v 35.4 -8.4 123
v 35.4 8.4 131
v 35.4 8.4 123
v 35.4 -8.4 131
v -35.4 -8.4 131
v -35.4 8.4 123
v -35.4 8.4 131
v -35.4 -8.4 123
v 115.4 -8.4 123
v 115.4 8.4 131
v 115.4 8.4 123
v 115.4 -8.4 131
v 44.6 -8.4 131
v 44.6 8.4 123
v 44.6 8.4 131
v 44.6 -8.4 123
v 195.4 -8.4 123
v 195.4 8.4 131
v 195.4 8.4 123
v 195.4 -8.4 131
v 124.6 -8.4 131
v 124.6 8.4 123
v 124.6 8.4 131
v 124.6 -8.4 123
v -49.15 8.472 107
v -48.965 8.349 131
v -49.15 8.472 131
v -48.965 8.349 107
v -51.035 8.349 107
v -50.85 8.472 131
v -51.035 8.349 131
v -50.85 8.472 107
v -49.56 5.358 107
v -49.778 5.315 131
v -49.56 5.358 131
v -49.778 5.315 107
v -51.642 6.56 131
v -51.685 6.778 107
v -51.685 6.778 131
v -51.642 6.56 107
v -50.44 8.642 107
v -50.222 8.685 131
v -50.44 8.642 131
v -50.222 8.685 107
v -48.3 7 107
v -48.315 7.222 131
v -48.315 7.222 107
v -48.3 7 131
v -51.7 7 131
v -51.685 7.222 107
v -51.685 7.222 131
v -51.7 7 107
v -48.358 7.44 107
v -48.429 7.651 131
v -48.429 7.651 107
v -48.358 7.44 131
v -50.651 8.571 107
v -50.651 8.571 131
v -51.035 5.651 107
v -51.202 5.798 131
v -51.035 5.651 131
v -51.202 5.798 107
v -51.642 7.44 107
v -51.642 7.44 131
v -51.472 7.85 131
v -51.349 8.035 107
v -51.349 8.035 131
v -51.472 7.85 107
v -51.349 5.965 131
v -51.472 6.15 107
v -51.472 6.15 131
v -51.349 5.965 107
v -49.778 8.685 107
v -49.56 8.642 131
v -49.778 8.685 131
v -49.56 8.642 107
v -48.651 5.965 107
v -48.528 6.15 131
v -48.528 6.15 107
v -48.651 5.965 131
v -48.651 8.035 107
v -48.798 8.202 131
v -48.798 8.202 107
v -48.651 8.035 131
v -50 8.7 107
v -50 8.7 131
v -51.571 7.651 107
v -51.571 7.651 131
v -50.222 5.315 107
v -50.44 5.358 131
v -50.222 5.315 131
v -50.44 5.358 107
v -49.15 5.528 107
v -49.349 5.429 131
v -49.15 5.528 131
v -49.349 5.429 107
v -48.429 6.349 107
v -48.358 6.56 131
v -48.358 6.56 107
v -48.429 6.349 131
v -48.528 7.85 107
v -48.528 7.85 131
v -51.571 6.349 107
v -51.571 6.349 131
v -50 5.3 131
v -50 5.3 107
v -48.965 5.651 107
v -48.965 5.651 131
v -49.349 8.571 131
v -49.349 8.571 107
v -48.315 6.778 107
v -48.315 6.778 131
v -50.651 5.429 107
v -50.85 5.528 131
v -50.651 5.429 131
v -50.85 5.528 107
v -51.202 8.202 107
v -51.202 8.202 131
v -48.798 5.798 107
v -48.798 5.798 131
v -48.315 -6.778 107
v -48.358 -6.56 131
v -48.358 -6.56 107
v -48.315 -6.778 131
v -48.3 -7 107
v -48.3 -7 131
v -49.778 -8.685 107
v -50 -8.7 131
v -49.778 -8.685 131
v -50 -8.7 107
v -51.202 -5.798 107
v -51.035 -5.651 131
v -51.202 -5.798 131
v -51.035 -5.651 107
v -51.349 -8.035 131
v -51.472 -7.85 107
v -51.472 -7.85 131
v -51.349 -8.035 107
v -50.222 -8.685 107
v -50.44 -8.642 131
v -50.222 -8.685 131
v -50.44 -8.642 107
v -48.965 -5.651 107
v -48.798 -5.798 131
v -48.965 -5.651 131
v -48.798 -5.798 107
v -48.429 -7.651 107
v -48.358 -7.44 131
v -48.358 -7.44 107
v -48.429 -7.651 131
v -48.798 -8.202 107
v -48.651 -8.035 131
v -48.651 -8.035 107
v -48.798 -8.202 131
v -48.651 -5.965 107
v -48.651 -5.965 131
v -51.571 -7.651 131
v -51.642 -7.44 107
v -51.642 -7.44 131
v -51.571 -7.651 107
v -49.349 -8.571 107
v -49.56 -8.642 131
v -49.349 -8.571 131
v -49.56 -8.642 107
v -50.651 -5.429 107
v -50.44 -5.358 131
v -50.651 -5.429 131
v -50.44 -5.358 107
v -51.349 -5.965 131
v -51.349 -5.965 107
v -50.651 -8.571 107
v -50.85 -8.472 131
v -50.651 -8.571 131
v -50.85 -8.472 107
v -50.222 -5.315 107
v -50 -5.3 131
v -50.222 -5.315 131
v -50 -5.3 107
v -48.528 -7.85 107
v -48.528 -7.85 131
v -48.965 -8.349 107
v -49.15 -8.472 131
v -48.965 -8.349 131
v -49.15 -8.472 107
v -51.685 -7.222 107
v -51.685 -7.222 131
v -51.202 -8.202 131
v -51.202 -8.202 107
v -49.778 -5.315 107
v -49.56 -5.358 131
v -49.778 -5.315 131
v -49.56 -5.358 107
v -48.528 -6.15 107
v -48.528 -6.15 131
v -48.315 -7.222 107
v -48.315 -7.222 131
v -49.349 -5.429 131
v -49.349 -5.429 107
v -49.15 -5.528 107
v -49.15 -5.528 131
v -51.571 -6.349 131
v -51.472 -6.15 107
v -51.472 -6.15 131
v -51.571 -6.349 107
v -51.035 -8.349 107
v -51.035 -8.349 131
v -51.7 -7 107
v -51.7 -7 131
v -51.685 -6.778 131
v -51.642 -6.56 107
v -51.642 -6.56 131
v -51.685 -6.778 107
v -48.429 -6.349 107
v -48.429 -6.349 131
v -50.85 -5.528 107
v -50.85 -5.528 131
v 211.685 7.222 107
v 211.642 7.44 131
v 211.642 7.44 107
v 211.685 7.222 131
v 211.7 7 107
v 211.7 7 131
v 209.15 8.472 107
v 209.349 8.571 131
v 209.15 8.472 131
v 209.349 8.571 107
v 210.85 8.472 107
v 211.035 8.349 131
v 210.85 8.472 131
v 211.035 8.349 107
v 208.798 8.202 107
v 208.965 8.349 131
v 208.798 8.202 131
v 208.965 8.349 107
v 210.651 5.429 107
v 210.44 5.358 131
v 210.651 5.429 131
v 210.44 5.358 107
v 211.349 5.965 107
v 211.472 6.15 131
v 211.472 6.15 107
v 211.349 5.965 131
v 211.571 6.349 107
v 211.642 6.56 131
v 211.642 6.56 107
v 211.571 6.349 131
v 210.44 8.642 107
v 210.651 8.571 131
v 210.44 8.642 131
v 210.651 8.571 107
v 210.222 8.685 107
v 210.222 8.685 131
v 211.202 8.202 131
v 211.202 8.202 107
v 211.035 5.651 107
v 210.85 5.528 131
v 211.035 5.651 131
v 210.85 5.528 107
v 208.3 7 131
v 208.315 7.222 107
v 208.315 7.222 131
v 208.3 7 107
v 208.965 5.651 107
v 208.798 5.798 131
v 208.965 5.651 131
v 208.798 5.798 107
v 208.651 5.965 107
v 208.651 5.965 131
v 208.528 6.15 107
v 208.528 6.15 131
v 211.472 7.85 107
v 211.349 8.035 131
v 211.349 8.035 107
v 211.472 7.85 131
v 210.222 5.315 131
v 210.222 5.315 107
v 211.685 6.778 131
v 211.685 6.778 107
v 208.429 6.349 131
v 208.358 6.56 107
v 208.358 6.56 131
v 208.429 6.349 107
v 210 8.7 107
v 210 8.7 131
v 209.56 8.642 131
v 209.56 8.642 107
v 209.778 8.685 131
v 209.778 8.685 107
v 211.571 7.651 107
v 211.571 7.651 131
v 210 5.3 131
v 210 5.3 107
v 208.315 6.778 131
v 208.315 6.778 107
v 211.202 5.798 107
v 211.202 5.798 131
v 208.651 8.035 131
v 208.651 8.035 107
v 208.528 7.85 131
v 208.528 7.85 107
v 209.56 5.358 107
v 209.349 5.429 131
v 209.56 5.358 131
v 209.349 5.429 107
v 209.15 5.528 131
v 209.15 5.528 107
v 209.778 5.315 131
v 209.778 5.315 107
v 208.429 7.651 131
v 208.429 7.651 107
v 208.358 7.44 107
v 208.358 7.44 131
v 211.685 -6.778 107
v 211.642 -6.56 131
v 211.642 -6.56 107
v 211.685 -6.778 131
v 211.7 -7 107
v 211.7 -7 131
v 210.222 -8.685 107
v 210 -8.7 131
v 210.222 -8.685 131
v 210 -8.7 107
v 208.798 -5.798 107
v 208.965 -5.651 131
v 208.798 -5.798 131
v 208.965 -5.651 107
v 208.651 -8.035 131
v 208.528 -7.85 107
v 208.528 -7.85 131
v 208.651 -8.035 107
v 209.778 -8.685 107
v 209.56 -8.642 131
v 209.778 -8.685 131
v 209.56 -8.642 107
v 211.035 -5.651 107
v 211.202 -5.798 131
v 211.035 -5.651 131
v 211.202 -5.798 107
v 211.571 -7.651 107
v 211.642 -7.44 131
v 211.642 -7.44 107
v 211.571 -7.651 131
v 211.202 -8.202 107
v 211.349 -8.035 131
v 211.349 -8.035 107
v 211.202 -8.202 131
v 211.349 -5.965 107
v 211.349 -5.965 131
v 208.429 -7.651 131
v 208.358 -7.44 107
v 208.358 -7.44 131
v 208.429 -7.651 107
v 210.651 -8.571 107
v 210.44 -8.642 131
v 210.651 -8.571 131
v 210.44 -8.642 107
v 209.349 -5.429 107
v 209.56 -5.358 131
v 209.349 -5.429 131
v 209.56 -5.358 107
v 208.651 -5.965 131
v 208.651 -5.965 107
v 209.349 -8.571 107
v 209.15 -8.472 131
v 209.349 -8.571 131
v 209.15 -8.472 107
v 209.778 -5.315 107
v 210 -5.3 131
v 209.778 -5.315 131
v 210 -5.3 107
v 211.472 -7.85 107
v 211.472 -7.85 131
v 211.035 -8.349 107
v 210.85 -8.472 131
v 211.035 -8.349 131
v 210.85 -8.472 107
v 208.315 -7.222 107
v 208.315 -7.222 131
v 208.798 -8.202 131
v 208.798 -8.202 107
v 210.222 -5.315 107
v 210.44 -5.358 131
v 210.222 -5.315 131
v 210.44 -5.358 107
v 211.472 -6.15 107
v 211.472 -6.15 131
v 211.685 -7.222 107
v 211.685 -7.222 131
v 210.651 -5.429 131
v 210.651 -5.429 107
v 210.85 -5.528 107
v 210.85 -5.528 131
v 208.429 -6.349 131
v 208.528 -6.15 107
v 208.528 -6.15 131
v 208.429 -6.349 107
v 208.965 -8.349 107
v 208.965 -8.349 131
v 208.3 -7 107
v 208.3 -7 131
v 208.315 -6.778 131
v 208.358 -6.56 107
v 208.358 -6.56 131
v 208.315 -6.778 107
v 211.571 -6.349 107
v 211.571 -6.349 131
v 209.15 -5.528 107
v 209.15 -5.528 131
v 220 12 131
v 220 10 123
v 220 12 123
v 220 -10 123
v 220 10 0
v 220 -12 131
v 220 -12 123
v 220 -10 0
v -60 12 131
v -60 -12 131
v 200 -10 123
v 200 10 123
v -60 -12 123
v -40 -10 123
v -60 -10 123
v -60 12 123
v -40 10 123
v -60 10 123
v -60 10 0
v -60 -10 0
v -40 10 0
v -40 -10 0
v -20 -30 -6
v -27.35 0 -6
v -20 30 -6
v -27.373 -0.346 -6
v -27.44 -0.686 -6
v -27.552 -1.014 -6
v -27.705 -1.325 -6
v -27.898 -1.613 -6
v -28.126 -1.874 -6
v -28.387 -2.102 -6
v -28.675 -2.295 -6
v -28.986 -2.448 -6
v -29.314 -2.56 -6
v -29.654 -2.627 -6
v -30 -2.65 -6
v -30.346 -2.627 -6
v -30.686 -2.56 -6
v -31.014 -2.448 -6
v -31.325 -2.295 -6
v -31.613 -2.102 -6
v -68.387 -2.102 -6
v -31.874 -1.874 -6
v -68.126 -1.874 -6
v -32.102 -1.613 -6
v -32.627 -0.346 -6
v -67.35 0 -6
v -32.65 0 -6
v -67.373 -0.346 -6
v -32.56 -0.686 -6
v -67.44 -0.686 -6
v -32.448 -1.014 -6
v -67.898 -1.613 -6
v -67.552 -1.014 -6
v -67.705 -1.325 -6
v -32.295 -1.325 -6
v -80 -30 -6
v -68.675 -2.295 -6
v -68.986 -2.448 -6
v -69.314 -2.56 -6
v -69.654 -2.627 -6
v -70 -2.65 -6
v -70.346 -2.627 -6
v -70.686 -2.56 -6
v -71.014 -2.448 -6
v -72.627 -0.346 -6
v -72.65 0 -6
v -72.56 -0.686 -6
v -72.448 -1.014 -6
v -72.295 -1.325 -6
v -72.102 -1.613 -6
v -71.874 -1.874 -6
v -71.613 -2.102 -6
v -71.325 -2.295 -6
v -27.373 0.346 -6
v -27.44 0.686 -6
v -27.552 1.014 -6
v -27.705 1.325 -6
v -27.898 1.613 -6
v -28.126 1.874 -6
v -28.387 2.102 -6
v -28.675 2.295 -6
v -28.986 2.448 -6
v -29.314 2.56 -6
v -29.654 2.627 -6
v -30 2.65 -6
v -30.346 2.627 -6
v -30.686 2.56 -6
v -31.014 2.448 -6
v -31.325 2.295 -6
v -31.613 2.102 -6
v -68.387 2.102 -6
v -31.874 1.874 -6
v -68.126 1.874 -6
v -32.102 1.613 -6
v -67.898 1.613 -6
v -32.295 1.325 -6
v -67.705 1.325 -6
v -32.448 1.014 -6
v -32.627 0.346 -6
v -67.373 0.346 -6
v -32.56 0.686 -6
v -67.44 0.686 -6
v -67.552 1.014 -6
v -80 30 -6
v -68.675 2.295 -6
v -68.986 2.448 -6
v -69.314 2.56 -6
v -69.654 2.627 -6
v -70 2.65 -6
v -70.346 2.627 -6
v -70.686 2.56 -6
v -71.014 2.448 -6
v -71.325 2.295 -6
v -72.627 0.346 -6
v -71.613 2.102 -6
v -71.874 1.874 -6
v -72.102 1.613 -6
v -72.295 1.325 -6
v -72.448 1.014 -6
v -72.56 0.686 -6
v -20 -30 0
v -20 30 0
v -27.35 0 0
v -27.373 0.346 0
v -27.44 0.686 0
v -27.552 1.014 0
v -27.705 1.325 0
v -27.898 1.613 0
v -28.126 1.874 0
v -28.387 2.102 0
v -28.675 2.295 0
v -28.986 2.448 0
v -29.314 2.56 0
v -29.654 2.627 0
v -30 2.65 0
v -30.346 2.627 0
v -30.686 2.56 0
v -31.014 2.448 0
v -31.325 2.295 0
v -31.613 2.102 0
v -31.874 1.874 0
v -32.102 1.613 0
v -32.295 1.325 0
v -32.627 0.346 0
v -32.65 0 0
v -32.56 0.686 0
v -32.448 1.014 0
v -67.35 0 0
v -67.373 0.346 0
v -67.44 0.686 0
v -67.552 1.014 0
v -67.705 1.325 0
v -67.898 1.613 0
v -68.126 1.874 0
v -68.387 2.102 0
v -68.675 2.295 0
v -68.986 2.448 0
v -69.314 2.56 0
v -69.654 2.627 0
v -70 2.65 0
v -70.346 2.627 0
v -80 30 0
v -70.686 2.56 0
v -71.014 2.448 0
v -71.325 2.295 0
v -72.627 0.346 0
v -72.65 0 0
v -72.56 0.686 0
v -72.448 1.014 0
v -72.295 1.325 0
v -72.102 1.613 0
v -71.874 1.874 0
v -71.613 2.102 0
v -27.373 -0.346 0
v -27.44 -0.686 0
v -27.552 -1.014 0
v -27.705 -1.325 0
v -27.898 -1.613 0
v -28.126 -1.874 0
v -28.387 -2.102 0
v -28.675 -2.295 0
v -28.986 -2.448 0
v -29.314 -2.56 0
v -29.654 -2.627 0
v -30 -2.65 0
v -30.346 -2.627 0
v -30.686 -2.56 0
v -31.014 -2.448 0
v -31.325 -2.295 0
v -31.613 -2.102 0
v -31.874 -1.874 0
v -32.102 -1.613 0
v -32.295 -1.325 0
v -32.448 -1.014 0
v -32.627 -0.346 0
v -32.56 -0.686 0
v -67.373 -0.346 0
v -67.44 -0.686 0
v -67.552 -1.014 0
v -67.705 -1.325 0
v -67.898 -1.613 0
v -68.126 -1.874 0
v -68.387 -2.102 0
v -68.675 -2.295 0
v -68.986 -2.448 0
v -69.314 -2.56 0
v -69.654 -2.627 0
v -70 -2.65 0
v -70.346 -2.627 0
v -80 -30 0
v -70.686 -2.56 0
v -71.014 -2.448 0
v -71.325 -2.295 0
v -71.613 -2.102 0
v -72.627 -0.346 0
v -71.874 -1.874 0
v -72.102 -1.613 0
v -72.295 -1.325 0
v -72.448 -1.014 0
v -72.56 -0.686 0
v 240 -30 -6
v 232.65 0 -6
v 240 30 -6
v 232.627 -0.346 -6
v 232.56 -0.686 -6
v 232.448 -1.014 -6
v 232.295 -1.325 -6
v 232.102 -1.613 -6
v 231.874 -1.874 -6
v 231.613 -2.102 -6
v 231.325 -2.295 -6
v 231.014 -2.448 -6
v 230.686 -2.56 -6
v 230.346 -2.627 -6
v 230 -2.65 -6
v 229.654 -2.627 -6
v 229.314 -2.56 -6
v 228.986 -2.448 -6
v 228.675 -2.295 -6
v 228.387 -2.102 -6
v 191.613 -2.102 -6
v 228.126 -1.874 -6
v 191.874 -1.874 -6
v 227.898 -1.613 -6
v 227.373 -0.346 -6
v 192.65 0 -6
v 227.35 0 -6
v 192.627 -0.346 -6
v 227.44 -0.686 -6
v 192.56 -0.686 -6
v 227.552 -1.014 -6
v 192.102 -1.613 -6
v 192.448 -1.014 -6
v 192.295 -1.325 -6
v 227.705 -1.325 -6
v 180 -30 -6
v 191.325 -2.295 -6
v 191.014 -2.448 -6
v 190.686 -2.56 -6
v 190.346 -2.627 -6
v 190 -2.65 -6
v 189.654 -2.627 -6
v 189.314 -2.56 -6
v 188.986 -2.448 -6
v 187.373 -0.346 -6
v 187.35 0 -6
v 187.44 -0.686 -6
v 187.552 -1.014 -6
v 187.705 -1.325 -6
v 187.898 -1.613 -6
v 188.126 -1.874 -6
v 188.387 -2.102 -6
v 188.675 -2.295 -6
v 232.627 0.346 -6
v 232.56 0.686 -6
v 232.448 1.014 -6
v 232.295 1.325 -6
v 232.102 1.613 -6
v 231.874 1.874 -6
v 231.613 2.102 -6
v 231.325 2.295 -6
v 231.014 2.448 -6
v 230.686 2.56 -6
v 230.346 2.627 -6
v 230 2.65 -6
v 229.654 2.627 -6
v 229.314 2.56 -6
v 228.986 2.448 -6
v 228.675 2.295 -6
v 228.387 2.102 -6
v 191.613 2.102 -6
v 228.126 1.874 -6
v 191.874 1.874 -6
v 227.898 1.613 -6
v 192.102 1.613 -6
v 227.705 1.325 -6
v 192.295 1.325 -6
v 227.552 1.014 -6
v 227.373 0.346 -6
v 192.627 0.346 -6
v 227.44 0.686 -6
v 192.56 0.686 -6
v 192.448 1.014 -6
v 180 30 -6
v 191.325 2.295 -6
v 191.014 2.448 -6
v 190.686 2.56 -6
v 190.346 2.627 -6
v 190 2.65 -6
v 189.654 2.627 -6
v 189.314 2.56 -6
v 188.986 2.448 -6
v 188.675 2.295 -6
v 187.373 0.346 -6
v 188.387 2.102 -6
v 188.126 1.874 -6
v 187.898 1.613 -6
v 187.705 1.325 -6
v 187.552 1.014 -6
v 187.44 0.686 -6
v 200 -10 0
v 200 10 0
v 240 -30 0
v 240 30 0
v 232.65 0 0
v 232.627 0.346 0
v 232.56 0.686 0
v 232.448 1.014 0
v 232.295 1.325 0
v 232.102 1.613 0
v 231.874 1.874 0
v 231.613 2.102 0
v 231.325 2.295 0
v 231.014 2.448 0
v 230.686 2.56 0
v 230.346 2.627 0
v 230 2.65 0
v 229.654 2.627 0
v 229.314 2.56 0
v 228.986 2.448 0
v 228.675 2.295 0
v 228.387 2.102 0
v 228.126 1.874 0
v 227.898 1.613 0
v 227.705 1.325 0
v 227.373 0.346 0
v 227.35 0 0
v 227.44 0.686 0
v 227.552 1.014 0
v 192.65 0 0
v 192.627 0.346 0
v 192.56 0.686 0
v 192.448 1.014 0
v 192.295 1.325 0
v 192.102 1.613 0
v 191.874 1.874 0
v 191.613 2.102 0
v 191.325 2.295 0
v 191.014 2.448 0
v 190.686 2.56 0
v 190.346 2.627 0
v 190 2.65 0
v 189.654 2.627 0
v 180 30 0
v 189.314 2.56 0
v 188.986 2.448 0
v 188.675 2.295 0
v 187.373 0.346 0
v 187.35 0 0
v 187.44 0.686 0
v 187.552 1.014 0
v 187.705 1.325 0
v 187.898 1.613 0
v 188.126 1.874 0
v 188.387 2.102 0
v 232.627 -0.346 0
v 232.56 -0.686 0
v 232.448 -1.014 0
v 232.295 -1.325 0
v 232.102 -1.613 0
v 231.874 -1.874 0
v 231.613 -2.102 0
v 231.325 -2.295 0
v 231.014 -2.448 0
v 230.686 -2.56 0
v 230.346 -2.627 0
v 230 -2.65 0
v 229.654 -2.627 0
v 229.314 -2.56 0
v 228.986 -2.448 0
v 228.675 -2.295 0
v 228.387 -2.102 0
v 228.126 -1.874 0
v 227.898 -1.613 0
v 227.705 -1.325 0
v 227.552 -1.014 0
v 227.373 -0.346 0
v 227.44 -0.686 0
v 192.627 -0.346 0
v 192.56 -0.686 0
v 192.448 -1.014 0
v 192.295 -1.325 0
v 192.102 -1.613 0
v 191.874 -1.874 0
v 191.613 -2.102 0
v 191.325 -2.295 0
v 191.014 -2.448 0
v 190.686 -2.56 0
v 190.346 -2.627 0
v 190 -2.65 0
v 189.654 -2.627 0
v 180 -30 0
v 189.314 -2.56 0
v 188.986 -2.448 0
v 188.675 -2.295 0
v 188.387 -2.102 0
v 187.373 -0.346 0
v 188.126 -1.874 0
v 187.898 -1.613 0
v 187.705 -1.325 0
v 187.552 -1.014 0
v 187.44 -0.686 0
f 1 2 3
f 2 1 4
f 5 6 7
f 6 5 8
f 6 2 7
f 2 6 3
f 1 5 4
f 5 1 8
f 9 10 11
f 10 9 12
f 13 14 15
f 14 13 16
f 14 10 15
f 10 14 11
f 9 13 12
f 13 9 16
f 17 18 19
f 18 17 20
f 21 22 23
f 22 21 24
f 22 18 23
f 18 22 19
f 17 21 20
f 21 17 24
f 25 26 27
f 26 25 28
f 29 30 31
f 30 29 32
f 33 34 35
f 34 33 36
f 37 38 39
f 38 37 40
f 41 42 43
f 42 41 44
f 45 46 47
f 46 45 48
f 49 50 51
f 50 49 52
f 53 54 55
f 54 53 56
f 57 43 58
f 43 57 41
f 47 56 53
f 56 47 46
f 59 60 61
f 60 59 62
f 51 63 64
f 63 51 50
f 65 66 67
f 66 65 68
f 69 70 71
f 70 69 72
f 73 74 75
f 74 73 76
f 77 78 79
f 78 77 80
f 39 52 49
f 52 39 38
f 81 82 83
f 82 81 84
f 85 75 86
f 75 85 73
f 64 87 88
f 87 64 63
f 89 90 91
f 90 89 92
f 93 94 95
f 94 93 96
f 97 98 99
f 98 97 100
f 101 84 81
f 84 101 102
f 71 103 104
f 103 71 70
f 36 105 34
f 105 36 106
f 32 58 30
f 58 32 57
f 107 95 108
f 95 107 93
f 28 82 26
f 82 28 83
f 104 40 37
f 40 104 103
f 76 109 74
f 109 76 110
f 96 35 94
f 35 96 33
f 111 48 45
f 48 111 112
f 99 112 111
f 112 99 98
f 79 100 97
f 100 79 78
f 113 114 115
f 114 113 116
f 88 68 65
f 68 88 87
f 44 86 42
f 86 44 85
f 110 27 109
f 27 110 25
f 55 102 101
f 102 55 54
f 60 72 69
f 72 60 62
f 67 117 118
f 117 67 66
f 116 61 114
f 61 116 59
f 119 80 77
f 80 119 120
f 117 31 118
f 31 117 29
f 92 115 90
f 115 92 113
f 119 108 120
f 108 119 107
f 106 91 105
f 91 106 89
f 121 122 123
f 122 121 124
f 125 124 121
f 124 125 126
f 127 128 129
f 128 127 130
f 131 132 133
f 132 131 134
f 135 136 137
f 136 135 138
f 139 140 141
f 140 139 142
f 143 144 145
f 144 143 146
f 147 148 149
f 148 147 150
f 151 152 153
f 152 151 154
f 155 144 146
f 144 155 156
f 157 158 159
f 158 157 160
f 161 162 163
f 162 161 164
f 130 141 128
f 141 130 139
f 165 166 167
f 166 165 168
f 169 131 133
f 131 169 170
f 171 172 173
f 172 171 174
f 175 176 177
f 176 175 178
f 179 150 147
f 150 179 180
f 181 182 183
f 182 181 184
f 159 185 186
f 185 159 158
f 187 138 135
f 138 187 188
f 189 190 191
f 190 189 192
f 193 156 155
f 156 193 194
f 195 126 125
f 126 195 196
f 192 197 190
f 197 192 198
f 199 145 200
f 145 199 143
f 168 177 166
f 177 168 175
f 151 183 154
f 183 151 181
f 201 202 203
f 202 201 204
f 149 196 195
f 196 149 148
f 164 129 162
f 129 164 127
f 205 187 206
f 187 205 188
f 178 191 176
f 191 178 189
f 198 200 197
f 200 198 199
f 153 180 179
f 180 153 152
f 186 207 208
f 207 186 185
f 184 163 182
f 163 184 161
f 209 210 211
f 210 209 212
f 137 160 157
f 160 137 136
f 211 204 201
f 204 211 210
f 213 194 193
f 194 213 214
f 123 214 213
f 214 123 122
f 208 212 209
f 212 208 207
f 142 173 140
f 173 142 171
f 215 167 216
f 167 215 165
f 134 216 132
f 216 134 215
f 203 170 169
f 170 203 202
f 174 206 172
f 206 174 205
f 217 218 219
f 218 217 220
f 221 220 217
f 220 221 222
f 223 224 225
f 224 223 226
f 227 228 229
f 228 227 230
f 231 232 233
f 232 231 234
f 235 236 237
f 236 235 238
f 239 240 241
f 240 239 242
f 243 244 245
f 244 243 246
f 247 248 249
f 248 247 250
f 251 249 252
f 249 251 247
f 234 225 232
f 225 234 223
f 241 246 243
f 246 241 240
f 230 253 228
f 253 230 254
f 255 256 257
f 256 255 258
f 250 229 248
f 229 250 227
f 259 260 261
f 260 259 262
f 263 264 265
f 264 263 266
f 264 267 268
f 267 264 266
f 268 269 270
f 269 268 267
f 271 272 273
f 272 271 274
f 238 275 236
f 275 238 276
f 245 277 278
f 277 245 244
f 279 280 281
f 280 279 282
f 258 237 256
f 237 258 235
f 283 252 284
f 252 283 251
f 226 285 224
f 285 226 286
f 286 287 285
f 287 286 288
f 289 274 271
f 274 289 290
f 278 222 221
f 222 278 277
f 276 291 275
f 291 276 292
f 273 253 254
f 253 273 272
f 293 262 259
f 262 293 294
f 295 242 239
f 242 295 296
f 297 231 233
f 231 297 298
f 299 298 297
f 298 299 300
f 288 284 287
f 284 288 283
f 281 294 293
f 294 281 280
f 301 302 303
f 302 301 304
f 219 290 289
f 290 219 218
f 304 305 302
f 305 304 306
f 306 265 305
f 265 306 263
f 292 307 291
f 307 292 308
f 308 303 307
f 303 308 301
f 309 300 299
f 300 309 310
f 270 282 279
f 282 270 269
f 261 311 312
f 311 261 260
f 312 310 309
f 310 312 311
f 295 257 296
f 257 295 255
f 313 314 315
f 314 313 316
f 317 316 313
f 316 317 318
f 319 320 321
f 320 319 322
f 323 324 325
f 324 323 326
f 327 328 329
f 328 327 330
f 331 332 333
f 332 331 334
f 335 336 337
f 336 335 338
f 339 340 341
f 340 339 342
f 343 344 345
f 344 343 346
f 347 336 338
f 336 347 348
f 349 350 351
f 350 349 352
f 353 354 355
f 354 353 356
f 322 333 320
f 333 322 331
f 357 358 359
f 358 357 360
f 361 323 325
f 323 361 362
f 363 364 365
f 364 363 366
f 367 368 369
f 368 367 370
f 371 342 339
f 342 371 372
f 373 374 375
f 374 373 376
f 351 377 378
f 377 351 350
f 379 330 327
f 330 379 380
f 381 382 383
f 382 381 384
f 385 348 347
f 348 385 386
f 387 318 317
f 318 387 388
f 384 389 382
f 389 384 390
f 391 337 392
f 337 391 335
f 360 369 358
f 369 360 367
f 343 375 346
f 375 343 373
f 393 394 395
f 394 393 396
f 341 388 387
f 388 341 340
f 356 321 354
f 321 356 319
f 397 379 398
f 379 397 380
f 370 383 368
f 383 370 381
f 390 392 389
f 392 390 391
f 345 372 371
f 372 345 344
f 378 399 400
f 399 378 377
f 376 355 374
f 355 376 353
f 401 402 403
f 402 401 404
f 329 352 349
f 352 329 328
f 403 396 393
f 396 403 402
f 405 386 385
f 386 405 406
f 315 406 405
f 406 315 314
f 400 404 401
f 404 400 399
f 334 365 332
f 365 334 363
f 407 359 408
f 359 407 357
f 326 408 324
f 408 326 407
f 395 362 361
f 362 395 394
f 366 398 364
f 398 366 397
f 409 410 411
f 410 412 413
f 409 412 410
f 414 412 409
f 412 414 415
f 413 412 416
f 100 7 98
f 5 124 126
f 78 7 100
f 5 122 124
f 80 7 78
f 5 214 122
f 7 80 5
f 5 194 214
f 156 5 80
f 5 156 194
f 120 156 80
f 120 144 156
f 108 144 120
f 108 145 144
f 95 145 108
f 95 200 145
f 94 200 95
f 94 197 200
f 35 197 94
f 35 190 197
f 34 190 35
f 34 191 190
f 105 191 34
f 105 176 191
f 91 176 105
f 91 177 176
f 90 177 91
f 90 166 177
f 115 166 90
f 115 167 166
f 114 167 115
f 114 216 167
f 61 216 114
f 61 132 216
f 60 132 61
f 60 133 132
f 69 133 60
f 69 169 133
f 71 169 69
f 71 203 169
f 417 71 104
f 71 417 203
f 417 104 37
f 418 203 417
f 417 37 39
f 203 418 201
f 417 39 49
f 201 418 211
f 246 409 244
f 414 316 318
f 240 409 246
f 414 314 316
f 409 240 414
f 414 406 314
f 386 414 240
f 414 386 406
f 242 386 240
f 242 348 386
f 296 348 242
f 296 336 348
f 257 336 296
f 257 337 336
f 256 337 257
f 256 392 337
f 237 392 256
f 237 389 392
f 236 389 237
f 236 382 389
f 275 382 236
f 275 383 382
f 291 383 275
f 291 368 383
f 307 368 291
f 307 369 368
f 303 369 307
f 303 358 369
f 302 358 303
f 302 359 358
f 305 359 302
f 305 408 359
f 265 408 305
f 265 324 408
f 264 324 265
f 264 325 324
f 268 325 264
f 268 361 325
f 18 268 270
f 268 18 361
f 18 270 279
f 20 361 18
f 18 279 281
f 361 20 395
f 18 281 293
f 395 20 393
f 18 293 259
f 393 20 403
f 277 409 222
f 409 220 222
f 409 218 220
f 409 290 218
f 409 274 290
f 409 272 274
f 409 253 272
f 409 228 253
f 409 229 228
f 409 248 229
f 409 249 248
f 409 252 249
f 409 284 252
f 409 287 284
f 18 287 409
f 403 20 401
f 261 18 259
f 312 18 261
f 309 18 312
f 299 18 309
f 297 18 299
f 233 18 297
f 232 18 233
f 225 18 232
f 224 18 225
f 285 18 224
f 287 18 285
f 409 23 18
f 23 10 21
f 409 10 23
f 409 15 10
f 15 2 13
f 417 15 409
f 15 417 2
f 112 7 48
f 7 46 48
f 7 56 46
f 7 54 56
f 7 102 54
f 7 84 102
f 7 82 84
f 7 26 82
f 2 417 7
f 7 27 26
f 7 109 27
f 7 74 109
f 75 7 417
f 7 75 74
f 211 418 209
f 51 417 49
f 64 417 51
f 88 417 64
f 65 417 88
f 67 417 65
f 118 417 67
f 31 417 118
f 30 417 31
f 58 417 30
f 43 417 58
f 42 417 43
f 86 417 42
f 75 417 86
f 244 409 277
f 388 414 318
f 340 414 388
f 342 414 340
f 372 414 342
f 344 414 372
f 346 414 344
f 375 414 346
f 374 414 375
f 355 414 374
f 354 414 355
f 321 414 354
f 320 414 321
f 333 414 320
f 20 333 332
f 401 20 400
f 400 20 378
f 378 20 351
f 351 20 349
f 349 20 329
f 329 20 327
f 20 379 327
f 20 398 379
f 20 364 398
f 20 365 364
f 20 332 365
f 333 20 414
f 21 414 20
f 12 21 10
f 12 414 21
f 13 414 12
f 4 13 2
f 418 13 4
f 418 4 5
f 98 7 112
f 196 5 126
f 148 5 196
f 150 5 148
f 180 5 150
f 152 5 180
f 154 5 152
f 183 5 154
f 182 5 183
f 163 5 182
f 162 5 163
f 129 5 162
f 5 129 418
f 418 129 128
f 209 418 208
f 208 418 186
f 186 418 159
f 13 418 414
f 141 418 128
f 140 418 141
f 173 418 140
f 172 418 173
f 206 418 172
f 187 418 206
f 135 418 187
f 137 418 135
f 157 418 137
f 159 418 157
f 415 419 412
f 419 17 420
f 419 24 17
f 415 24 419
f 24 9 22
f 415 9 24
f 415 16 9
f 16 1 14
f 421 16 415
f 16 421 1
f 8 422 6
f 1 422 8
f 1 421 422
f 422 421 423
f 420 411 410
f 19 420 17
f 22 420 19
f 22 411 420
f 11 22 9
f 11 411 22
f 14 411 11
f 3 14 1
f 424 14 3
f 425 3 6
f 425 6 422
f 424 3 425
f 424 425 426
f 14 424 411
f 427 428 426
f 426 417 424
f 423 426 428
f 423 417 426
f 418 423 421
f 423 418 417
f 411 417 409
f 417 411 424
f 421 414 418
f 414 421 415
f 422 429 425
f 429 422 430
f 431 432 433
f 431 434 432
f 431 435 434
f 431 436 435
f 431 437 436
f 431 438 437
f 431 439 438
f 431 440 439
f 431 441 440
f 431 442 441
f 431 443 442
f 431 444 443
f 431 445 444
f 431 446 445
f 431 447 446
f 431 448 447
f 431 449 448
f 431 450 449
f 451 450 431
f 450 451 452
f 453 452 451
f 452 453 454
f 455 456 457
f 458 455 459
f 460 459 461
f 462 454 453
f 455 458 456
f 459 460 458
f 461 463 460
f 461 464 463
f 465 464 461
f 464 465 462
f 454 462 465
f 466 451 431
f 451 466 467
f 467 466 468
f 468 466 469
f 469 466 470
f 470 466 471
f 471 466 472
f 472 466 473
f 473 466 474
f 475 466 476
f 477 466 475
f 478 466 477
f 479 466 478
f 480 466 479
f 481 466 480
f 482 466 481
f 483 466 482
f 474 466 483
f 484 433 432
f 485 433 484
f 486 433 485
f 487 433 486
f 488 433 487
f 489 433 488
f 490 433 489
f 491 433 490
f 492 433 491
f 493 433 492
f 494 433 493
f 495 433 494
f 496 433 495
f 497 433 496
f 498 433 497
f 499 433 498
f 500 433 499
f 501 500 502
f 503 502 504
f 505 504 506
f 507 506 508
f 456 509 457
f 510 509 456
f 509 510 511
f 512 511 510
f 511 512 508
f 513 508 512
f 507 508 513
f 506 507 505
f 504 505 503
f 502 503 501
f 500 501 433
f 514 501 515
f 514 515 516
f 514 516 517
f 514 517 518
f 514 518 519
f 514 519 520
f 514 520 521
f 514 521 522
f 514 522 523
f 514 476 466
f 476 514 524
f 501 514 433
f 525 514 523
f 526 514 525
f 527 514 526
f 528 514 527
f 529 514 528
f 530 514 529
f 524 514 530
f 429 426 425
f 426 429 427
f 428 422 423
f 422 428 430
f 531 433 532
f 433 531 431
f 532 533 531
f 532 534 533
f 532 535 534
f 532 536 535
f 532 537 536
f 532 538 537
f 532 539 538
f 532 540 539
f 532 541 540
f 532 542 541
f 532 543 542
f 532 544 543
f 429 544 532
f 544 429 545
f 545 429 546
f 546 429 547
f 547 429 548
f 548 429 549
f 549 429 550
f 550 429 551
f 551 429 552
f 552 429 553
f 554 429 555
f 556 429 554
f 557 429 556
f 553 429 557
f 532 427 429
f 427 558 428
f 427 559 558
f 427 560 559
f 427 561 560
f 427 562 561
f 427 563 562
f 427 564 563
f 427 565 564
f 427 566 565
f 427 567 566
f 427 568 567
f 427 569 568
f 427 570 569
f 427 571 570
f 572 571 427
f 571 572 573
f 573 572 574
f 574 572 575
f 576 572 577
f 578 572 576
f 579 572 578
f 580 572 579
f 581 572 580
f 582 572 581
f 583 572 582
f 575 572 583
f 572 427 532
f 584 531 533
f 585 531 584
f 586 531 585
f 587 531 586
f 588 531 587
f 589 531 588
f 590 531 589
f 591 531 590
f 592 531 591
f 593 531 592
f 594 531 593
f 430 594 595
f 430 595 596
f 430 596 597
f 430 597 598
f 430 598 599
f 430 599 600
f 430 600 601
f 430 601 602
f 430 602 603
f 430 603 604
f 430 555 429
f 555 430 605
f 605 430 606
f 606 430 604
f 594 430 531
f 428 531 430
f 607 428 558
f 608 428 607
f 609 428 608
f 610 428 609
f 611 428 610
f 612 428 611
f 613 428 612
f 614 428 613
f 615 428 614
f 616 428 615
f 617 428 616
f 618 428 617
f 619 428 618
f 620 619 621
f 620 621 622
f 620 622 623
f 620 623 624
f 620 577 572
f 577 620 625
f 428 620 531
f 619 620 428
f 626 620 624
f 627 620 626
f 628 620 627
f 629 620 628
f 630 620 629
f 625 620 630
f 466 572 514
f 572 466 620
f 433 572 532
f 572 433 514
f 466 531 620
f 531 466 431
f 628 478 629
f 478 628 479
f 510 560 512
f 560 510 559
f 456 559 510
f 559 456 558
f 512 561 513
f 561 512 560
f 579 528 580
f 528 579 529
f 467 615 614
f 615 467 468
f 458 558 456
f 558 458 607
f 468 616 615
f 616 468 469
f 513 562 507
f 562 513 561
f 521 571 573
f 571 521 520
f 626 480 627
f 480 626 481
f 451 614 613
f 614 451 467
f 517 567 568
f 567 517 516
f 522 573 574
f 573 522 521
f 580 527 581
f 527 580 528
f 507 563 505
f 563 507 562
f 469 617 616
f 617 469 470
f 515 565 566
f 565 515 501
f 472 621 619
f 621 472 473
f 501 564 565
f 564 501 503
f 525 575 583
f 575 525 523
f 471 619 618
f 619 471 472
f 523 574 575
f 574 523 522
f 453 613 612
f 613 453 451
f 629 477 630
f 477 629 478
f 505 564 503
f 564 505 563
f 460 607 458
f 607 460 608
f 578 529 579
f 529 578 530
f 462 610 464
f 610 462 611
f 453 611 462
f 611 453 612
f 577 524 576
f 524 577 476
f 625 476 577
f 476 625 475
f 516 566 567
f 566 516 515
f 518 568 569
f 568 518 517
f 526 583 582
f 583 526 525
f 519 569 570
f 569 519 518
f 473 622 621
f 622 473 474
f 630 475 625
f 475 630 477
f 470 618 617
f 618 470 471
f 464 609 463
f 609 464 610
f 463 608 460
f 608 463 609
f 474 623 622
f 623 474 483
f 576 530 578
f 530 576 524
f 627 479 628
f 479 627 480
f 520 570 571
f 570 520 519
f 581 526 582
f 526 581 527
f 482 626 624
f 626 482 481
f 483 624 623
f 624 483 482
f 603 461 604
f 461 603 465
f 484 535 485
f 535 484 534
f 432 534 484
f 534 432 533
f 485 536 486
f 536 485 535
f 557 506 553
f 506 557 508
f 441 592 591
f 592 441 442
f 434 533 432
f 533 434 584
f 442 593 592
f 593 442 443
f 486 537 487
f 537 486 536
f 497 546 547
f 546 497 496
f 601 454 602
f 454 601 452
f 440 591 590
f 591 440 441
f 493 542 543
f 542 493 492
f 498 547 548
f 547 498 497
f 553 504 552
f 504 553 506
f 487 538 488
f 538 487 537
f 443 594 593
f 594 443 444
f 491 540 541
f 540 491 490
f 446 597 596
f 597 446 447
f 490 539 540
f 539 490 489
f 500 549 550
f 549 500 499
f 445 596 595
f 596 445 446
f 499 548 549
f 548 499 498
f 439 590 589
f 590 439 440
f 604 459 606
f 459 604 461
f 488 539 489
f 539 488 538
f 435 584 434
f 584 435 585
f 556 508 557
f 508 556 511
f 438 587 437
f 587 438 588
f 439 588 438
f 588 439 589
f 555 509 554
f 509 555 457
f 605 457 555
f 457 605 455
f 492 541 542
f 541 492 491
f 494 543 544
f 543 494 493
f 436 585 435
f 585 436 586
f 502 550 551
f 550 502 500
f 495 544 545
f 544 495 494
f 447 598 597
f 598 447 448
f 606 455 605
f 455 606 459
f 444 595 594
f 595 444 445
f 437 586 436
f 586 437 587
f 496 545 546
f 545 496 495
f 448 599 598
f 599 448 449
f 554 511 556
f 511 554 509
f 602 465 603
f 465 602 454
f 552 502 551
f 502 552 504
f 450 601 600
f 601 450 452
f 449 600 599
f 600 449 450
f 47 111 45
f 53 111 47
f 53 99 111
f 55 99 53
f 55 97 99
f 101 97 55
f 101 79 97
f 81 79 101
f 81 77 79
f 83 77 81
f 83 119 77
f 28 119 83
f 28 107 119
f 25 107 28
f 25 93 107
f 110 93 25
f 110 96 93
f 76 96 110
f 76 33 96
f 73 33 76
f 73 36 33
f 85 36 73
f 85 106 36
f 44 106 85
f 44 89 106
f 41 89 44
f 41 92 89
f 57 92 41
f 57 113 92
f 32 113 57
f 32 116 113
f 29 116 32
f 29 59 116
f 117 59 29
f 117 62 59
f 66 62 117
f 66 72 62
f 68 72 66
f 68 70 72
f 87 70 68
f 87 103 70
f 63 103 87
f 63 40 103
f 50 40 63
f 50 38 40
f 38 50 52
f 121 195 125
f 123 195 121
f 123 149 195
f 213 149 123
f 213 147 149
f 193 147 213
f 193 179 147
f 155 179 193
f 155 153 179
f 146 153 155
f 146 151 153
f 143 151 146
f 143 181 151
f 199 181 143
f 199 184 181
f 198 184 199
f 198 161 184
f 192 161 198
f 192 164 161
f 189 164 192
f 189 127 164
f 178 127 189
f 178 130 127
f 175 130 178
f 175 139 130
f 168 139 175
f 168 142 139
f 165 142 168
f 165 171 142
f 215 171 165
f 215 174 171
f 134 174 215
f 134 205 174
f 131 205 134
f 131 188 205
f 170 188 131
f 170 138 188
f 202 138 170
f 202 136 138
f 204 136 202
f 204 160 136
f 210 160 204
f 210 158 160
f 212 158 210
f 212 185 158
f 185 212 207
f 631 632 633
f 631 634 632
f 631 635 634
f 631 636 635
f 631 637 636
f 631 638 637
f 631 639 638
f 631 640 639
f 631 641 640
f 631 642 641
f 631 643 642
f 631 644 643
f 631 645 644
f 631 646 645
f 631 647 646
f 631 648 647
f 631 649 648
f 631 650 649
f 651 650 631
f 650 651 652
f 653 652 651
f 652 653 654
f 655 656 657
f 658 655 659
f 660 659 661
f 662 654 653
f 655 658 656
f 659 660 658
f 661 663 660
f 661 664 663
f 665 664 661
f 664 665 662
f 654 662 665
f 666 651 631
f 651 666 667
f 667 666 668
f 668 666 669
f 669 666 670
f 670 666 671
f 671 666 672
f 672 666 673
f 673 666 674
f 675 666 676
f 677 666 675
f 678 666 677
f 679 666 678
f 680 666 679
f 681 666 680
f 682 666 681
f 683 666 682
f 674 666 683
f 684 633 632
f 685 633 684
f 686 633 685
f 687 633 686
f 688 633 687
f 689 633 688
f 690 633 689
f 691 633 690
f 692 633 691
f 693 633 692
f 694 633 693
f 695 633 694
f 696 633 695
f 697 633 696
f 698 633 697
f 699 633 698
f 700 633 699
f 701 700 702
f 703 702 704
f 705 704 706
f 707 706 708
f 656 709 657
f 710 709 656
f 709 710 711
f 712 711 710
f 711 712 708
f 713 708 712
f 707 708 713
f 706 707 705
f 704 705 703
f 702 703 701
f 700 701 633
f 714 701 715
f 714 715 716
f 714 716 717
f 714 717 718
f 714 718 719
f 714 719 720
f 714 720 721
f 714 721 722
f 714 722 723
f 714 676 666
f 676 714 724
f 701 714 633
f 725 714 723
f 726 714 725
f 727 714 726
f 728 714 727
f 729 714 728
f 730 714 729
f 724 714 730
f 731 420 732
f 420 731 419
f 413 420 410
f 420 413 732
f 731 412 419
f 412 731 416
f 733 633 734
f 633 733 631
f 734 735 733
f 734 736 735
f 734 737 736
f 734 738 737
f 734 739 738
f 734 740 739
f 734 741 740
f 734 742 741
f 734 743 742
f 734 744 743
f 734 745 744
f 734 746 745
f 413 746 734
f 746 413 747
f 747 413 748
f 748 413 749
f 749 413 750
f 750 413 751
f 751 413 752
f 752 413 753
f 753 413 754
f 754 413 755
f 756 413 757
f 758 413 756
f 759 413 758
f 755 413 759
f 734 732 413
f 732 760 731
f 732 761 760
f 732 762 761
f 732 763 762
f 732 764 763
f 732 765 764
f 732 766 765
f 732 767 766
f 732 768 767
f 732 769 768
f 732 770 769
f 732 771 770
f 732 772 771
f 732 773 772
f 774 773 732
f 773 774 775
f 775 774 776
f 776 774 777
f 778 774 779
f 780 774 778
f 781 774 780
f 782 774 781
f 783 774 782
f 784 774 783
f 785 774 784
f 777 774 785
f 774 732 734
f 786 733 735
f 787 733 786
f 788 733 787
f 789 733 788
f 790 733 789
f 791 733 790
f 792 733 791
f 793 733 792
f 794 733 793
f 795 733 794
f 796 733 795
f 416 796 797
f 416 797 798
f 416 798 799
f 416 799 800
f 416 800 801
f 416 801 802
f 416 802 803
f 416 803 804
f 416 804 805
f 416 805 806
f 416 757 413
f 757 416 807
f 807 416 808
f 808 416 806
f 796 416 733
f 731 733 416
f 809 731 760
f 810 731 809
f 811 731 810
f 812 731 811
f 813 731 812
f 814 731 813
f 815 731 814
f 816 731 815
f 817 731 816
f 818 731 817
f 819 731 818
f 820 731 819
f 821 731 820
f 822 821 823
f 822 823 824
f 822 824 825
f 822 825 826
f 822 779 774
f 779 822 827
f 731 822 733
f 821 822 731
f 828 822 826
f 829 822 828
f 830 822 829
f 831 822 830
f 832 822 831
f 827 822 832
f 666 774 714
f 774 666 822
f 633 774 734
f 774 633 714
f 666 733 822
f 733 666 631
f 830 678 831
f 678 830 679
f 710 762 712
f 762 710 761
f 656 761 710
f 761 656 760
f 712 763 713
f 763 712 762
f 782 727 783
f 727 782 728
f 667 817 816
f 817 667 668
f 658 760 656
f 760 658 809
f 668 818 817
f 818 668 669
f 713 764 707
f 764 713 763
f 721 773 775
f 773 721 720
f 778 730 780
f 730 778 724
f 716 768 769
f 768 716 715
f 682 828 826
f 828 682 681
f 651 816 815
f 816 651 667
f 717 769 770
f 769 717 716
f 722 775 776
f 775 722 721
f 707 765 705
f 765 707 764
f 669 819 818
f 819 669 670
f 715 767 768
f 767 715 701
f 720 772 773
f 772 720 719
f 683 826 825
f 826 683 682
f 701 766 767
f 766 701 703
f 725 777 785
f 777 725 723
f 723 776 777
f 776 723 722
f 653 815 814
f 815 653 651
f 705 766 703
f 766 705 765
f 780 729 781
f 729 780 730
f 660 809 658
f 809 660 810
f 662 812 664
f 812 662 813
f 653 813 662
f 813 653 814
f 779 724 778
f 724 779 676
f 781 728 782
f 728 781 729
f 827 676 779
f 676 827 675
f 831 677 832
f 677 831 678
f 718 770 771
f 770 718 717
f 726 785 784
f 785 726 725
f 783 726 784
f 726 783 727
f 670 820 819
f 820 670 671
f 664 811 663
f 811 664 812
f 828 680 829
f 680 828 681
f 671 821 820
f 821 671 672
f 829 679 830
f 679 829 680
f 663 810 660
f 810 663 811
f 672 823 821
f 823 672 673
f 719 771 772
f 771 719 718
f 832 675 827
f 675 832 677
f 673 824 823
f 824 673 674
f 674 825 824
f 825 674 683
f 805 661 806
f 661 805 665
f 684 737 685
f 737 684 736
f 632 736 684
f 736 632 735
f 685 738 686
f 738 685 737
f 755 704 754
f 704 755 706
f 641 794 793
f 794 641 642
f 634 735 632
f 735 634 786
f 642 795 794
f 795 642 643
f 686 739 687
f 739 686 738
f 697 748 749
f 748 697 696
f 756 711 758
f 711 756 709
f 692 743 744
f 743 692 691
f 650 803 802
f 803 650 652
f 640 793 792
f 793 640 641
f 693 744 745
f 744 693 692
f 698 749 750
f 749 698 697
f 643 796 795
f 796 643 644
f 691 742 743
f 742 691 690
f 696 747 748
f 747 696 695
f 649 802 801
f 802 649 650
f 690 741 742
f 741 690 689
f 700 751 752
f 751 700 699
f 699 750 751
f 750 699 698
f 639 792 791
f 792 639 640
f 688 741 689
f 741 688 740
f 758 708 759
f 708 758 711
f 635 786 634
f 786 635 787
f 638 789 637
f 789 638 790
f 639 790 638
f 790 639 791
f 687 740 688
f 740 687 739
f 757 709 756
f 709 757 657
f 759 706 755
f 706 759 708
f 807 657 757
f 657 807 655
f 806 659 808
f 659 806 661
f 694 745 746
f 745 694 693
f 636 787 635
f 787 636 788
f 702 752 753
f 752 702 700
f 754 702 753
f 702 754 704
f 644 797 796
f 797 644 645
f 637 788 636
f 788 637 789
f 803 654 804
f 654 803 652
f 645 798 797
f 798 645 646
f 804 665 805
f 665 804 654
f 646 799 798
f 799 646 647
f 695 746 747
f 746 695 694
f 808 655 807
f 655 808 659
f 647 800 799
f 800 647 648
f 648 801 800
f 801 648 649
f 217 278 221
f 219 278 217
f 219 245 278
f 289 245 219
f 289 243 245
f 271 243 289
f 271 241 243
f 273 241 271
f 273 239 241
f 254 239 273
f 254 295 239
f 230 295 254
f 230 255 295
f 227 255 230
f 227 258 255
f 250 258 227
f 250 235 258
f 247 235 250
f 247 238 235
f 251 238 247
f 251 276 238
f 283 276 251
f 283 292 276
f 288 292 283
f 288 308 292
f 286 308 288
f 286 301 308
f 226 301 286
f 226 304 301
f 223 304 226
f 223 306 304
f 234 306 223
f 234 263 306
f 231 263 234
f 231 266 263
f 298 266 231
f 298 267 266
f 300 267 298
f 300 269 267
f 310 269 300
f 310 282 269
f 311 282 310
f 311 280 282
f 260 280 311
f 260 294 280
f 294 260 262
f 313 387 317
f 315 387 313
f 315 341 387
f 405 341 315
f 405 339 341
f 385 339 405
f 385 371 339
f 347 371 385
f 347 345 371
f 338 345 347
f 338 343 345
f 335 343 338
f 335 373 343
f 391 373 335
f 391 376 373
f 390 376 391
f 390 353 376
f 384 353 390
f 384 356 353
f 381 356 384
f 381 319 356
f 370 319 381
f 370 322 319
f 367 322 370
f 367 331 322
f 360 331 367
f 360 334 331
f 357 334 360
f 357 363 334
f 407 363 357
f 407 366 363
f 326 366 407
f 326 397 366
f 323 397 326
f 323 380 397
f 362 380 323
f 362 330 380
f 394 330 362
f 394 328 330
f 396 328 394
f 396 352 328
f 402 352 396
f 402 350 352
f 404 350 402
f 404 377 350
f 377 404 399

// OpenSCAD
// Mesoscope RAILS — bioreactor bridge (Brücke) as ONE printable piece on two
// separate end towers (Türme). 3 printed parts total: 1 bridge + 2 towers.
//
// Holds N bioreactor chips ("Chip senkrecht") in series along X, HANGING
// hochkant, for the tilted-microscope linear-rail scan
// (see docs/RAIL_MOUNT_CONCEPT.md §3, §6).
//
// Concept (one-piece bridge + separate towers — supersedes the earlier
// 3-segment half-lap split of this same file, and is the alternative to the
// metal-spine rack of bioreactor_rack.scad):
//   * ONE continuous traverse board (the bridge) with a drop-in chip through-
//     hole per station; each chip drops in FROM THE TOP, a 2 mm Kranz (rim)
//     rests FLAT on the board top, the chip HANGS below. Tubes exit the top.
//   * Imaging is horizontal THROUGH the 16 mm chip thickness: light source +Y ->
//     chip -> objective -Y. The optical window sits at the chip vertical centre
//     (= optical axis), well below the board, so the board never blocks the view.
//   * The bridge spans only the STATION ROW plus a short end margin (no long
//     overhang), so at N<=3 it stays UNDER the 300 mm print bed and prints as a
//     SINGLE piece — no splice needed. (At N>=4 the bare chip row already
//     exceeds the bed; reduce N or re-introduce a splice.)
//   * Two separate end TOWERS rise from the shared base plate (Grundplatte) and
//     sit just OUTSIDE the end chips; the bridge ends bolt down onto the tower
//     tops with 2x M3 each. The space BELOW the chips stays free so the moving
//     mesoscope reaches every station.
//
// The chip itself exists only as a mesh STL (no SCAD source), so the chip+Kranz
// here is a NON-PRINT reference block (show_chip_ref) for visualising the fit.
// The printed parts are the 1 bridge board + 2 towers.
//
// STANDALONE: no upstream OpenFlexure clone needed — render directly.
//   ./build_bridge_split.sh 3
//   openscad -o bridge.stl -D part="bridge" -D N=3 bioreactor_bridge_split.scad
//   openscad            -D part="all"  bioreactor_bridge_split.scad   // F5 preview
//
// Axes (in-use orientation, matching rail_mount_mesoscope.scad / bioreactor_rack.scad):
//   X = along the rail / chip width
//   Y = optical axis / chip thickness (imaged through)
//   Z = vertical (gravity down); chips hang, bridge + towers above

// ---------------------------------------------------------------------------
// Chip geometry (bare body, hanging hochkant; base plate excluded per doc §6)
// ---------------------------------------------------------------------------
chip_w = 70;    // X  chip width (along the rail)
chip_t = 16;    // Y  chip thickness (optical axis, imaged through)
chip_h = 40;    // Z  chip height (hanging)
window_w = 18;  // X  optical cutout width on the -Y face (ROI Ø5 inside)
window_h = 8;   // Z  optical cutout height
port_d  = 4.5;  // fluidic ports on the TOP edge (tubes point up)
port_dx = 30;   // outer port pair X offset from centre (approx)

// Kranz (hanging flange around the chip top; rests FLAT on the board top)
kranz_w = 2;    // rim width added per side (X and Y)
kranz_h = 4;    // Z height of the flange lip (protrudes above the board top)

// ---------------------------------------------------------------------------
// Bridge configuration
// ---------------------------------------------------------------------------
N = 3;                 // number of stations in series (<=3 keeps the bridge 1-piece)
reactor_pitch = 80;    // centre-to-centre along X (70 chip + 10 gap)

// Optical-axis height — TODO: finalize once the Z-motor resting face / carriage
// height is fixed (docs/RAIL_MOUNT_CONCEPT.md §2, §7.1a, §8). Chip vertical
// centre (= optical window) lands here, measured from the Grundplatte top (z=0).
OPTICAL_AXIS_H = 115;  // PLACEHOLDER (matches oa_h in the massing model)

board_t = 8;                        // bridge board thickness (Z)
board_w = chip_t + 2*kranz_w + 4;   // board width in Y (24): chip hole + margin
fit     = 0.4;                      // chip through-hole clearance per side

// End margin: how far the board extends beyond the OUTER chip edge at each end.
// The tower sits in this margin, just outside the end chip. Larger = more head
// clearance at the end stations, but a longer (eventually too-long) bridge.
end_ext = 25;

// ---------------------------------------------------------------------------
// Board -> tower bolts (2x M3 per end, top-down into the tower top)
// ---------------------------------------------------------------------------
m3_clear   = 3.4;     // M3 screw through-hole in the board
screw_dy   = 7;       // screw offset from board centre in Y (two per end)
MAX_BED    = 300;     // print-bed limit (X); the one-piece bridge must stay under this

// ---------------------------------------------------------------------------
// Towers (slim end supports: bolt to the Grundplatte, carry the bridge ends)
// ---------------------------------------------------------------------------
pillar        = 20;    // square tower cross-section (slim so the bridge end clears the end chip)
foot_h = 6;            // tower foot slab thickness (Z), bolts to Grundplatte
M5 = 5.3;              // M5 clearance (tower-foot bolt holes)
BEAM_SLOT_PITCH = 20;  // Grundplatte T-nut hole pattern along X in each foot
pillar_m3 = 3.4;       // board-to-tower bolt holes on the tower top

// Preview / render switches
part          = "all"; // "all" | "bridge" | "pillarL" | "pillarR"
exploded      = false; // lift the bridge off the towers for a presentation render
show_chip_ref = false; // draw NON-PRINT chip+Kranz reference blocks

$fn = 48;
EPS  = 0.01;

// ---------------------------------------------------------------------------
// Derived layout
// ---------------------------------------------------------------------------
span        = (N - 1) * reactor_pitch;     // X extent of the station row (centres)
// The bridge covers the station row + end_ext beyond each outer chip edge.
bx0         = -chip_w/2 - end_ext;         // board start (just left of the first chip)
bx1         =  span + chip_w/2 + end_ext;  // board end   (just right of the last chip)
board_len   = bx1 - bx0;

// Towers sit under the board ends, just outside the end chips.
pillar_l_cx = bx0 + pillar/2;              // left tower centre (X)
pillar_r_cx = bx1 - pillar/2;              // right tower centre (X)

chip_top_z  = OPTICAL_AXIS_H + chip_h/2;   // chip top
board_top   = chip_top_z - kranz_h;        // Kranz rests FLAT on the board top
board_bottom= board_top - board_t;

y0          = -board_w/2;                  // board spans y0 .. y0+board_w

// Outer chip / Kranz edges (for the tower-clearance assertion)
kranz_half_x = chip_w/2 + kranz_w;         // Kranz reaches ±kranz_half_x in X
pillar_l_inner = pillar_l_cx + pillar/2;   // inner face of the left tower
pillar_r_inner = pillar_r_cx - pillar/2;

// Sanity checks
assert(N >= 2, "N must be >= 2 for a series bridge.");
assert(board_len < MAX_BED,
       str("one-piece bridge too long for the bed: ", board_len,
           " mm >= ", MAX_BED, " mm — reduce N or re-introduce a splice."));
assert(pillar_l_inner <= -kranz_half_x,
       "left tower overlaps the first chip/Kranz in X — increase end_ext or slim the tower.");
assert(pillar_r_inner >= span + kranz_half_x,
       "right tower overlaps the last chip/Kranz in X — increase end_ext or slim the tower.");
assert(board_bottom >= 0, "OPTICAL_AXIS_H too small: board_bottom below the Grundplatte.");
assert(screw_dy + m3_clear/2 < board_w/2, "screw_dy too large: M3 holes break out of the board width.");
assert(screw_dy + pillar_m3/2 < pillar/2, "screw_dy too large for the tower top.");
echo(str("Bridge (1-piece): N=", N, "  board=", board_len, " x ", board_w, " x ", board_t,
         "mm (bed ", MAX_BED, ")  towers @ X=", pillar_l_cx, ",", pillar_r_cx,
         "  board_top z=", board_top));

// ---------------------------------------------------------------------------
// Per-station chip through-holes
// ---------------------------------------------------------------------------
module board_holes() {
    for (k = [0 : N-1]) {
        xc = k * reactor_pitch;
        translate([xc - (chip_w/2 + fit), -(chip_t/2 + fit), board_bottom - EPS])
            cube([chip_w + 2*fit, chip_t + 2*fit, board_t + 2*EPS]);
    }
}

// ---------------------------------------------------------------------------
// The one-piece bridge board
// ---------------------------------------------------------------------------
module bridge() {
    color([0.8, 0.55, 0.3])
    difference() {
        translate([bx0, y0, board_bottom]) cube([board_len, board_w, board_t]);
        board_holes();
        // board -> tower bolts: 2x M3 through-holes at each end over the tower
        for (px = [pillar_l_cx, pillar_r_cx])
            for (sy = [screw_dy, -screw_dy])
                translate([px, sy, board_bottom - EPS])
                    cylinder(d = m3_clear, h = board_t + 2*EPS);
    }
}

// ---------------------------------------------------------------------------
// End towers: Grundplatte -> board bottom, M5 foot bolts + 2x M3 board bolts up top
// ---------------------------------------------------------------------------
module tower_with_foot(px) {
    foot_x = pillar + 2*BEAM_SLOT_PITCH;
    color([0.8, 0.45, 0.25])
    difference() {
        union() {
            translate([px - pillar/2, -pillar/2, -foot_h])
                cube([pillar, pillar, board_bottom + foot_h]);
            translate([px - foot_x/2, -foot_x/2, -foot_h])
                cube([foot_x, foot_x, foot_h]);
        }
        // M5 Grundplatte bolts straddling the tower along X
        for (hx = [px - BEAM_SLOT_PITCH, px + BEAM_SLOT_PITCH])
            translate([hx, 0, -foot_h - EPS]) cylinder(d = M5, h = foot_h + 2*EPS);
        // 2x M3 blind holes in the tower top (bridge end bolts down into these;
        // self-tap or heat-set M3 insert). Drilled DOWN from the tower top.
        for (sy = [screw_dy, -screw_dy])
            translate([px, sy, board_bottom - 16]) cylinder(d = pillar_m3, h = 16 + EPS);
    }
}

// ---------------------------------------------------------------------------
// NON-PRINT reference: one chip + 2 mm Kranz + window + top tube stubs
// ---------------------------------------------------------------------------
module chip_ref() {
    kox = chip_w + 2*kranz_w;
    koy = chip_t + 2*kranz_w;
    color([0.75, 0.85, 0.9, 0.55])
    translate([-chip_w/2, -chip_t/2, OPTICAL_AXIS_H - chip_h/2])
        cube([chip_w, chip_t, chip_h]);
    color([0.55, 0.75, 0.85, 0.7])
    translate([-kox/2, -koy/2, chip_top_z - kranz_h]) cube([kox, koy, kranz_h]);
    color([0.1, 0.6, 0.9, 0.8])
    translate([-window_w/2, -chip_t/2 - 0.6, OPTICAL_AXIS_H - window_h/2])
        cube([window_w, 0.8, window_h]);
    color([0.15, 0.15, 0.15, 0.8])
    for (dx = [-port_dx, -port_dx + 12, port_dx - 12, port_dx])
        translate([dx, 0, chip_top_z]) cylinder(h = 16, d = port_d);
}

// ---------------------------------------------------------------------------
// Assembly / dispatch
// ---------------------------------------------------------------------------
ex = exploded ? 70 : 0;   // bridge lift for the preview render

module assembly() {
    translate([0, 0, ex]) bridge();
    tower_with_foot(pillar_l_cx);
    tower_with_foot(pillar_r_cx);
    if (show_chip_ref)
        for (k = [0 : N-1]) translate([k*reactor_pitch, 0, 0]) chip_ref();
}

if      (part == "bridge")  bridge();
else if (part == "pillarL") tower_with_foot(0);
else if (part == "pillarR") tower_with_foot(0);
else                        assembly();   // "all"
